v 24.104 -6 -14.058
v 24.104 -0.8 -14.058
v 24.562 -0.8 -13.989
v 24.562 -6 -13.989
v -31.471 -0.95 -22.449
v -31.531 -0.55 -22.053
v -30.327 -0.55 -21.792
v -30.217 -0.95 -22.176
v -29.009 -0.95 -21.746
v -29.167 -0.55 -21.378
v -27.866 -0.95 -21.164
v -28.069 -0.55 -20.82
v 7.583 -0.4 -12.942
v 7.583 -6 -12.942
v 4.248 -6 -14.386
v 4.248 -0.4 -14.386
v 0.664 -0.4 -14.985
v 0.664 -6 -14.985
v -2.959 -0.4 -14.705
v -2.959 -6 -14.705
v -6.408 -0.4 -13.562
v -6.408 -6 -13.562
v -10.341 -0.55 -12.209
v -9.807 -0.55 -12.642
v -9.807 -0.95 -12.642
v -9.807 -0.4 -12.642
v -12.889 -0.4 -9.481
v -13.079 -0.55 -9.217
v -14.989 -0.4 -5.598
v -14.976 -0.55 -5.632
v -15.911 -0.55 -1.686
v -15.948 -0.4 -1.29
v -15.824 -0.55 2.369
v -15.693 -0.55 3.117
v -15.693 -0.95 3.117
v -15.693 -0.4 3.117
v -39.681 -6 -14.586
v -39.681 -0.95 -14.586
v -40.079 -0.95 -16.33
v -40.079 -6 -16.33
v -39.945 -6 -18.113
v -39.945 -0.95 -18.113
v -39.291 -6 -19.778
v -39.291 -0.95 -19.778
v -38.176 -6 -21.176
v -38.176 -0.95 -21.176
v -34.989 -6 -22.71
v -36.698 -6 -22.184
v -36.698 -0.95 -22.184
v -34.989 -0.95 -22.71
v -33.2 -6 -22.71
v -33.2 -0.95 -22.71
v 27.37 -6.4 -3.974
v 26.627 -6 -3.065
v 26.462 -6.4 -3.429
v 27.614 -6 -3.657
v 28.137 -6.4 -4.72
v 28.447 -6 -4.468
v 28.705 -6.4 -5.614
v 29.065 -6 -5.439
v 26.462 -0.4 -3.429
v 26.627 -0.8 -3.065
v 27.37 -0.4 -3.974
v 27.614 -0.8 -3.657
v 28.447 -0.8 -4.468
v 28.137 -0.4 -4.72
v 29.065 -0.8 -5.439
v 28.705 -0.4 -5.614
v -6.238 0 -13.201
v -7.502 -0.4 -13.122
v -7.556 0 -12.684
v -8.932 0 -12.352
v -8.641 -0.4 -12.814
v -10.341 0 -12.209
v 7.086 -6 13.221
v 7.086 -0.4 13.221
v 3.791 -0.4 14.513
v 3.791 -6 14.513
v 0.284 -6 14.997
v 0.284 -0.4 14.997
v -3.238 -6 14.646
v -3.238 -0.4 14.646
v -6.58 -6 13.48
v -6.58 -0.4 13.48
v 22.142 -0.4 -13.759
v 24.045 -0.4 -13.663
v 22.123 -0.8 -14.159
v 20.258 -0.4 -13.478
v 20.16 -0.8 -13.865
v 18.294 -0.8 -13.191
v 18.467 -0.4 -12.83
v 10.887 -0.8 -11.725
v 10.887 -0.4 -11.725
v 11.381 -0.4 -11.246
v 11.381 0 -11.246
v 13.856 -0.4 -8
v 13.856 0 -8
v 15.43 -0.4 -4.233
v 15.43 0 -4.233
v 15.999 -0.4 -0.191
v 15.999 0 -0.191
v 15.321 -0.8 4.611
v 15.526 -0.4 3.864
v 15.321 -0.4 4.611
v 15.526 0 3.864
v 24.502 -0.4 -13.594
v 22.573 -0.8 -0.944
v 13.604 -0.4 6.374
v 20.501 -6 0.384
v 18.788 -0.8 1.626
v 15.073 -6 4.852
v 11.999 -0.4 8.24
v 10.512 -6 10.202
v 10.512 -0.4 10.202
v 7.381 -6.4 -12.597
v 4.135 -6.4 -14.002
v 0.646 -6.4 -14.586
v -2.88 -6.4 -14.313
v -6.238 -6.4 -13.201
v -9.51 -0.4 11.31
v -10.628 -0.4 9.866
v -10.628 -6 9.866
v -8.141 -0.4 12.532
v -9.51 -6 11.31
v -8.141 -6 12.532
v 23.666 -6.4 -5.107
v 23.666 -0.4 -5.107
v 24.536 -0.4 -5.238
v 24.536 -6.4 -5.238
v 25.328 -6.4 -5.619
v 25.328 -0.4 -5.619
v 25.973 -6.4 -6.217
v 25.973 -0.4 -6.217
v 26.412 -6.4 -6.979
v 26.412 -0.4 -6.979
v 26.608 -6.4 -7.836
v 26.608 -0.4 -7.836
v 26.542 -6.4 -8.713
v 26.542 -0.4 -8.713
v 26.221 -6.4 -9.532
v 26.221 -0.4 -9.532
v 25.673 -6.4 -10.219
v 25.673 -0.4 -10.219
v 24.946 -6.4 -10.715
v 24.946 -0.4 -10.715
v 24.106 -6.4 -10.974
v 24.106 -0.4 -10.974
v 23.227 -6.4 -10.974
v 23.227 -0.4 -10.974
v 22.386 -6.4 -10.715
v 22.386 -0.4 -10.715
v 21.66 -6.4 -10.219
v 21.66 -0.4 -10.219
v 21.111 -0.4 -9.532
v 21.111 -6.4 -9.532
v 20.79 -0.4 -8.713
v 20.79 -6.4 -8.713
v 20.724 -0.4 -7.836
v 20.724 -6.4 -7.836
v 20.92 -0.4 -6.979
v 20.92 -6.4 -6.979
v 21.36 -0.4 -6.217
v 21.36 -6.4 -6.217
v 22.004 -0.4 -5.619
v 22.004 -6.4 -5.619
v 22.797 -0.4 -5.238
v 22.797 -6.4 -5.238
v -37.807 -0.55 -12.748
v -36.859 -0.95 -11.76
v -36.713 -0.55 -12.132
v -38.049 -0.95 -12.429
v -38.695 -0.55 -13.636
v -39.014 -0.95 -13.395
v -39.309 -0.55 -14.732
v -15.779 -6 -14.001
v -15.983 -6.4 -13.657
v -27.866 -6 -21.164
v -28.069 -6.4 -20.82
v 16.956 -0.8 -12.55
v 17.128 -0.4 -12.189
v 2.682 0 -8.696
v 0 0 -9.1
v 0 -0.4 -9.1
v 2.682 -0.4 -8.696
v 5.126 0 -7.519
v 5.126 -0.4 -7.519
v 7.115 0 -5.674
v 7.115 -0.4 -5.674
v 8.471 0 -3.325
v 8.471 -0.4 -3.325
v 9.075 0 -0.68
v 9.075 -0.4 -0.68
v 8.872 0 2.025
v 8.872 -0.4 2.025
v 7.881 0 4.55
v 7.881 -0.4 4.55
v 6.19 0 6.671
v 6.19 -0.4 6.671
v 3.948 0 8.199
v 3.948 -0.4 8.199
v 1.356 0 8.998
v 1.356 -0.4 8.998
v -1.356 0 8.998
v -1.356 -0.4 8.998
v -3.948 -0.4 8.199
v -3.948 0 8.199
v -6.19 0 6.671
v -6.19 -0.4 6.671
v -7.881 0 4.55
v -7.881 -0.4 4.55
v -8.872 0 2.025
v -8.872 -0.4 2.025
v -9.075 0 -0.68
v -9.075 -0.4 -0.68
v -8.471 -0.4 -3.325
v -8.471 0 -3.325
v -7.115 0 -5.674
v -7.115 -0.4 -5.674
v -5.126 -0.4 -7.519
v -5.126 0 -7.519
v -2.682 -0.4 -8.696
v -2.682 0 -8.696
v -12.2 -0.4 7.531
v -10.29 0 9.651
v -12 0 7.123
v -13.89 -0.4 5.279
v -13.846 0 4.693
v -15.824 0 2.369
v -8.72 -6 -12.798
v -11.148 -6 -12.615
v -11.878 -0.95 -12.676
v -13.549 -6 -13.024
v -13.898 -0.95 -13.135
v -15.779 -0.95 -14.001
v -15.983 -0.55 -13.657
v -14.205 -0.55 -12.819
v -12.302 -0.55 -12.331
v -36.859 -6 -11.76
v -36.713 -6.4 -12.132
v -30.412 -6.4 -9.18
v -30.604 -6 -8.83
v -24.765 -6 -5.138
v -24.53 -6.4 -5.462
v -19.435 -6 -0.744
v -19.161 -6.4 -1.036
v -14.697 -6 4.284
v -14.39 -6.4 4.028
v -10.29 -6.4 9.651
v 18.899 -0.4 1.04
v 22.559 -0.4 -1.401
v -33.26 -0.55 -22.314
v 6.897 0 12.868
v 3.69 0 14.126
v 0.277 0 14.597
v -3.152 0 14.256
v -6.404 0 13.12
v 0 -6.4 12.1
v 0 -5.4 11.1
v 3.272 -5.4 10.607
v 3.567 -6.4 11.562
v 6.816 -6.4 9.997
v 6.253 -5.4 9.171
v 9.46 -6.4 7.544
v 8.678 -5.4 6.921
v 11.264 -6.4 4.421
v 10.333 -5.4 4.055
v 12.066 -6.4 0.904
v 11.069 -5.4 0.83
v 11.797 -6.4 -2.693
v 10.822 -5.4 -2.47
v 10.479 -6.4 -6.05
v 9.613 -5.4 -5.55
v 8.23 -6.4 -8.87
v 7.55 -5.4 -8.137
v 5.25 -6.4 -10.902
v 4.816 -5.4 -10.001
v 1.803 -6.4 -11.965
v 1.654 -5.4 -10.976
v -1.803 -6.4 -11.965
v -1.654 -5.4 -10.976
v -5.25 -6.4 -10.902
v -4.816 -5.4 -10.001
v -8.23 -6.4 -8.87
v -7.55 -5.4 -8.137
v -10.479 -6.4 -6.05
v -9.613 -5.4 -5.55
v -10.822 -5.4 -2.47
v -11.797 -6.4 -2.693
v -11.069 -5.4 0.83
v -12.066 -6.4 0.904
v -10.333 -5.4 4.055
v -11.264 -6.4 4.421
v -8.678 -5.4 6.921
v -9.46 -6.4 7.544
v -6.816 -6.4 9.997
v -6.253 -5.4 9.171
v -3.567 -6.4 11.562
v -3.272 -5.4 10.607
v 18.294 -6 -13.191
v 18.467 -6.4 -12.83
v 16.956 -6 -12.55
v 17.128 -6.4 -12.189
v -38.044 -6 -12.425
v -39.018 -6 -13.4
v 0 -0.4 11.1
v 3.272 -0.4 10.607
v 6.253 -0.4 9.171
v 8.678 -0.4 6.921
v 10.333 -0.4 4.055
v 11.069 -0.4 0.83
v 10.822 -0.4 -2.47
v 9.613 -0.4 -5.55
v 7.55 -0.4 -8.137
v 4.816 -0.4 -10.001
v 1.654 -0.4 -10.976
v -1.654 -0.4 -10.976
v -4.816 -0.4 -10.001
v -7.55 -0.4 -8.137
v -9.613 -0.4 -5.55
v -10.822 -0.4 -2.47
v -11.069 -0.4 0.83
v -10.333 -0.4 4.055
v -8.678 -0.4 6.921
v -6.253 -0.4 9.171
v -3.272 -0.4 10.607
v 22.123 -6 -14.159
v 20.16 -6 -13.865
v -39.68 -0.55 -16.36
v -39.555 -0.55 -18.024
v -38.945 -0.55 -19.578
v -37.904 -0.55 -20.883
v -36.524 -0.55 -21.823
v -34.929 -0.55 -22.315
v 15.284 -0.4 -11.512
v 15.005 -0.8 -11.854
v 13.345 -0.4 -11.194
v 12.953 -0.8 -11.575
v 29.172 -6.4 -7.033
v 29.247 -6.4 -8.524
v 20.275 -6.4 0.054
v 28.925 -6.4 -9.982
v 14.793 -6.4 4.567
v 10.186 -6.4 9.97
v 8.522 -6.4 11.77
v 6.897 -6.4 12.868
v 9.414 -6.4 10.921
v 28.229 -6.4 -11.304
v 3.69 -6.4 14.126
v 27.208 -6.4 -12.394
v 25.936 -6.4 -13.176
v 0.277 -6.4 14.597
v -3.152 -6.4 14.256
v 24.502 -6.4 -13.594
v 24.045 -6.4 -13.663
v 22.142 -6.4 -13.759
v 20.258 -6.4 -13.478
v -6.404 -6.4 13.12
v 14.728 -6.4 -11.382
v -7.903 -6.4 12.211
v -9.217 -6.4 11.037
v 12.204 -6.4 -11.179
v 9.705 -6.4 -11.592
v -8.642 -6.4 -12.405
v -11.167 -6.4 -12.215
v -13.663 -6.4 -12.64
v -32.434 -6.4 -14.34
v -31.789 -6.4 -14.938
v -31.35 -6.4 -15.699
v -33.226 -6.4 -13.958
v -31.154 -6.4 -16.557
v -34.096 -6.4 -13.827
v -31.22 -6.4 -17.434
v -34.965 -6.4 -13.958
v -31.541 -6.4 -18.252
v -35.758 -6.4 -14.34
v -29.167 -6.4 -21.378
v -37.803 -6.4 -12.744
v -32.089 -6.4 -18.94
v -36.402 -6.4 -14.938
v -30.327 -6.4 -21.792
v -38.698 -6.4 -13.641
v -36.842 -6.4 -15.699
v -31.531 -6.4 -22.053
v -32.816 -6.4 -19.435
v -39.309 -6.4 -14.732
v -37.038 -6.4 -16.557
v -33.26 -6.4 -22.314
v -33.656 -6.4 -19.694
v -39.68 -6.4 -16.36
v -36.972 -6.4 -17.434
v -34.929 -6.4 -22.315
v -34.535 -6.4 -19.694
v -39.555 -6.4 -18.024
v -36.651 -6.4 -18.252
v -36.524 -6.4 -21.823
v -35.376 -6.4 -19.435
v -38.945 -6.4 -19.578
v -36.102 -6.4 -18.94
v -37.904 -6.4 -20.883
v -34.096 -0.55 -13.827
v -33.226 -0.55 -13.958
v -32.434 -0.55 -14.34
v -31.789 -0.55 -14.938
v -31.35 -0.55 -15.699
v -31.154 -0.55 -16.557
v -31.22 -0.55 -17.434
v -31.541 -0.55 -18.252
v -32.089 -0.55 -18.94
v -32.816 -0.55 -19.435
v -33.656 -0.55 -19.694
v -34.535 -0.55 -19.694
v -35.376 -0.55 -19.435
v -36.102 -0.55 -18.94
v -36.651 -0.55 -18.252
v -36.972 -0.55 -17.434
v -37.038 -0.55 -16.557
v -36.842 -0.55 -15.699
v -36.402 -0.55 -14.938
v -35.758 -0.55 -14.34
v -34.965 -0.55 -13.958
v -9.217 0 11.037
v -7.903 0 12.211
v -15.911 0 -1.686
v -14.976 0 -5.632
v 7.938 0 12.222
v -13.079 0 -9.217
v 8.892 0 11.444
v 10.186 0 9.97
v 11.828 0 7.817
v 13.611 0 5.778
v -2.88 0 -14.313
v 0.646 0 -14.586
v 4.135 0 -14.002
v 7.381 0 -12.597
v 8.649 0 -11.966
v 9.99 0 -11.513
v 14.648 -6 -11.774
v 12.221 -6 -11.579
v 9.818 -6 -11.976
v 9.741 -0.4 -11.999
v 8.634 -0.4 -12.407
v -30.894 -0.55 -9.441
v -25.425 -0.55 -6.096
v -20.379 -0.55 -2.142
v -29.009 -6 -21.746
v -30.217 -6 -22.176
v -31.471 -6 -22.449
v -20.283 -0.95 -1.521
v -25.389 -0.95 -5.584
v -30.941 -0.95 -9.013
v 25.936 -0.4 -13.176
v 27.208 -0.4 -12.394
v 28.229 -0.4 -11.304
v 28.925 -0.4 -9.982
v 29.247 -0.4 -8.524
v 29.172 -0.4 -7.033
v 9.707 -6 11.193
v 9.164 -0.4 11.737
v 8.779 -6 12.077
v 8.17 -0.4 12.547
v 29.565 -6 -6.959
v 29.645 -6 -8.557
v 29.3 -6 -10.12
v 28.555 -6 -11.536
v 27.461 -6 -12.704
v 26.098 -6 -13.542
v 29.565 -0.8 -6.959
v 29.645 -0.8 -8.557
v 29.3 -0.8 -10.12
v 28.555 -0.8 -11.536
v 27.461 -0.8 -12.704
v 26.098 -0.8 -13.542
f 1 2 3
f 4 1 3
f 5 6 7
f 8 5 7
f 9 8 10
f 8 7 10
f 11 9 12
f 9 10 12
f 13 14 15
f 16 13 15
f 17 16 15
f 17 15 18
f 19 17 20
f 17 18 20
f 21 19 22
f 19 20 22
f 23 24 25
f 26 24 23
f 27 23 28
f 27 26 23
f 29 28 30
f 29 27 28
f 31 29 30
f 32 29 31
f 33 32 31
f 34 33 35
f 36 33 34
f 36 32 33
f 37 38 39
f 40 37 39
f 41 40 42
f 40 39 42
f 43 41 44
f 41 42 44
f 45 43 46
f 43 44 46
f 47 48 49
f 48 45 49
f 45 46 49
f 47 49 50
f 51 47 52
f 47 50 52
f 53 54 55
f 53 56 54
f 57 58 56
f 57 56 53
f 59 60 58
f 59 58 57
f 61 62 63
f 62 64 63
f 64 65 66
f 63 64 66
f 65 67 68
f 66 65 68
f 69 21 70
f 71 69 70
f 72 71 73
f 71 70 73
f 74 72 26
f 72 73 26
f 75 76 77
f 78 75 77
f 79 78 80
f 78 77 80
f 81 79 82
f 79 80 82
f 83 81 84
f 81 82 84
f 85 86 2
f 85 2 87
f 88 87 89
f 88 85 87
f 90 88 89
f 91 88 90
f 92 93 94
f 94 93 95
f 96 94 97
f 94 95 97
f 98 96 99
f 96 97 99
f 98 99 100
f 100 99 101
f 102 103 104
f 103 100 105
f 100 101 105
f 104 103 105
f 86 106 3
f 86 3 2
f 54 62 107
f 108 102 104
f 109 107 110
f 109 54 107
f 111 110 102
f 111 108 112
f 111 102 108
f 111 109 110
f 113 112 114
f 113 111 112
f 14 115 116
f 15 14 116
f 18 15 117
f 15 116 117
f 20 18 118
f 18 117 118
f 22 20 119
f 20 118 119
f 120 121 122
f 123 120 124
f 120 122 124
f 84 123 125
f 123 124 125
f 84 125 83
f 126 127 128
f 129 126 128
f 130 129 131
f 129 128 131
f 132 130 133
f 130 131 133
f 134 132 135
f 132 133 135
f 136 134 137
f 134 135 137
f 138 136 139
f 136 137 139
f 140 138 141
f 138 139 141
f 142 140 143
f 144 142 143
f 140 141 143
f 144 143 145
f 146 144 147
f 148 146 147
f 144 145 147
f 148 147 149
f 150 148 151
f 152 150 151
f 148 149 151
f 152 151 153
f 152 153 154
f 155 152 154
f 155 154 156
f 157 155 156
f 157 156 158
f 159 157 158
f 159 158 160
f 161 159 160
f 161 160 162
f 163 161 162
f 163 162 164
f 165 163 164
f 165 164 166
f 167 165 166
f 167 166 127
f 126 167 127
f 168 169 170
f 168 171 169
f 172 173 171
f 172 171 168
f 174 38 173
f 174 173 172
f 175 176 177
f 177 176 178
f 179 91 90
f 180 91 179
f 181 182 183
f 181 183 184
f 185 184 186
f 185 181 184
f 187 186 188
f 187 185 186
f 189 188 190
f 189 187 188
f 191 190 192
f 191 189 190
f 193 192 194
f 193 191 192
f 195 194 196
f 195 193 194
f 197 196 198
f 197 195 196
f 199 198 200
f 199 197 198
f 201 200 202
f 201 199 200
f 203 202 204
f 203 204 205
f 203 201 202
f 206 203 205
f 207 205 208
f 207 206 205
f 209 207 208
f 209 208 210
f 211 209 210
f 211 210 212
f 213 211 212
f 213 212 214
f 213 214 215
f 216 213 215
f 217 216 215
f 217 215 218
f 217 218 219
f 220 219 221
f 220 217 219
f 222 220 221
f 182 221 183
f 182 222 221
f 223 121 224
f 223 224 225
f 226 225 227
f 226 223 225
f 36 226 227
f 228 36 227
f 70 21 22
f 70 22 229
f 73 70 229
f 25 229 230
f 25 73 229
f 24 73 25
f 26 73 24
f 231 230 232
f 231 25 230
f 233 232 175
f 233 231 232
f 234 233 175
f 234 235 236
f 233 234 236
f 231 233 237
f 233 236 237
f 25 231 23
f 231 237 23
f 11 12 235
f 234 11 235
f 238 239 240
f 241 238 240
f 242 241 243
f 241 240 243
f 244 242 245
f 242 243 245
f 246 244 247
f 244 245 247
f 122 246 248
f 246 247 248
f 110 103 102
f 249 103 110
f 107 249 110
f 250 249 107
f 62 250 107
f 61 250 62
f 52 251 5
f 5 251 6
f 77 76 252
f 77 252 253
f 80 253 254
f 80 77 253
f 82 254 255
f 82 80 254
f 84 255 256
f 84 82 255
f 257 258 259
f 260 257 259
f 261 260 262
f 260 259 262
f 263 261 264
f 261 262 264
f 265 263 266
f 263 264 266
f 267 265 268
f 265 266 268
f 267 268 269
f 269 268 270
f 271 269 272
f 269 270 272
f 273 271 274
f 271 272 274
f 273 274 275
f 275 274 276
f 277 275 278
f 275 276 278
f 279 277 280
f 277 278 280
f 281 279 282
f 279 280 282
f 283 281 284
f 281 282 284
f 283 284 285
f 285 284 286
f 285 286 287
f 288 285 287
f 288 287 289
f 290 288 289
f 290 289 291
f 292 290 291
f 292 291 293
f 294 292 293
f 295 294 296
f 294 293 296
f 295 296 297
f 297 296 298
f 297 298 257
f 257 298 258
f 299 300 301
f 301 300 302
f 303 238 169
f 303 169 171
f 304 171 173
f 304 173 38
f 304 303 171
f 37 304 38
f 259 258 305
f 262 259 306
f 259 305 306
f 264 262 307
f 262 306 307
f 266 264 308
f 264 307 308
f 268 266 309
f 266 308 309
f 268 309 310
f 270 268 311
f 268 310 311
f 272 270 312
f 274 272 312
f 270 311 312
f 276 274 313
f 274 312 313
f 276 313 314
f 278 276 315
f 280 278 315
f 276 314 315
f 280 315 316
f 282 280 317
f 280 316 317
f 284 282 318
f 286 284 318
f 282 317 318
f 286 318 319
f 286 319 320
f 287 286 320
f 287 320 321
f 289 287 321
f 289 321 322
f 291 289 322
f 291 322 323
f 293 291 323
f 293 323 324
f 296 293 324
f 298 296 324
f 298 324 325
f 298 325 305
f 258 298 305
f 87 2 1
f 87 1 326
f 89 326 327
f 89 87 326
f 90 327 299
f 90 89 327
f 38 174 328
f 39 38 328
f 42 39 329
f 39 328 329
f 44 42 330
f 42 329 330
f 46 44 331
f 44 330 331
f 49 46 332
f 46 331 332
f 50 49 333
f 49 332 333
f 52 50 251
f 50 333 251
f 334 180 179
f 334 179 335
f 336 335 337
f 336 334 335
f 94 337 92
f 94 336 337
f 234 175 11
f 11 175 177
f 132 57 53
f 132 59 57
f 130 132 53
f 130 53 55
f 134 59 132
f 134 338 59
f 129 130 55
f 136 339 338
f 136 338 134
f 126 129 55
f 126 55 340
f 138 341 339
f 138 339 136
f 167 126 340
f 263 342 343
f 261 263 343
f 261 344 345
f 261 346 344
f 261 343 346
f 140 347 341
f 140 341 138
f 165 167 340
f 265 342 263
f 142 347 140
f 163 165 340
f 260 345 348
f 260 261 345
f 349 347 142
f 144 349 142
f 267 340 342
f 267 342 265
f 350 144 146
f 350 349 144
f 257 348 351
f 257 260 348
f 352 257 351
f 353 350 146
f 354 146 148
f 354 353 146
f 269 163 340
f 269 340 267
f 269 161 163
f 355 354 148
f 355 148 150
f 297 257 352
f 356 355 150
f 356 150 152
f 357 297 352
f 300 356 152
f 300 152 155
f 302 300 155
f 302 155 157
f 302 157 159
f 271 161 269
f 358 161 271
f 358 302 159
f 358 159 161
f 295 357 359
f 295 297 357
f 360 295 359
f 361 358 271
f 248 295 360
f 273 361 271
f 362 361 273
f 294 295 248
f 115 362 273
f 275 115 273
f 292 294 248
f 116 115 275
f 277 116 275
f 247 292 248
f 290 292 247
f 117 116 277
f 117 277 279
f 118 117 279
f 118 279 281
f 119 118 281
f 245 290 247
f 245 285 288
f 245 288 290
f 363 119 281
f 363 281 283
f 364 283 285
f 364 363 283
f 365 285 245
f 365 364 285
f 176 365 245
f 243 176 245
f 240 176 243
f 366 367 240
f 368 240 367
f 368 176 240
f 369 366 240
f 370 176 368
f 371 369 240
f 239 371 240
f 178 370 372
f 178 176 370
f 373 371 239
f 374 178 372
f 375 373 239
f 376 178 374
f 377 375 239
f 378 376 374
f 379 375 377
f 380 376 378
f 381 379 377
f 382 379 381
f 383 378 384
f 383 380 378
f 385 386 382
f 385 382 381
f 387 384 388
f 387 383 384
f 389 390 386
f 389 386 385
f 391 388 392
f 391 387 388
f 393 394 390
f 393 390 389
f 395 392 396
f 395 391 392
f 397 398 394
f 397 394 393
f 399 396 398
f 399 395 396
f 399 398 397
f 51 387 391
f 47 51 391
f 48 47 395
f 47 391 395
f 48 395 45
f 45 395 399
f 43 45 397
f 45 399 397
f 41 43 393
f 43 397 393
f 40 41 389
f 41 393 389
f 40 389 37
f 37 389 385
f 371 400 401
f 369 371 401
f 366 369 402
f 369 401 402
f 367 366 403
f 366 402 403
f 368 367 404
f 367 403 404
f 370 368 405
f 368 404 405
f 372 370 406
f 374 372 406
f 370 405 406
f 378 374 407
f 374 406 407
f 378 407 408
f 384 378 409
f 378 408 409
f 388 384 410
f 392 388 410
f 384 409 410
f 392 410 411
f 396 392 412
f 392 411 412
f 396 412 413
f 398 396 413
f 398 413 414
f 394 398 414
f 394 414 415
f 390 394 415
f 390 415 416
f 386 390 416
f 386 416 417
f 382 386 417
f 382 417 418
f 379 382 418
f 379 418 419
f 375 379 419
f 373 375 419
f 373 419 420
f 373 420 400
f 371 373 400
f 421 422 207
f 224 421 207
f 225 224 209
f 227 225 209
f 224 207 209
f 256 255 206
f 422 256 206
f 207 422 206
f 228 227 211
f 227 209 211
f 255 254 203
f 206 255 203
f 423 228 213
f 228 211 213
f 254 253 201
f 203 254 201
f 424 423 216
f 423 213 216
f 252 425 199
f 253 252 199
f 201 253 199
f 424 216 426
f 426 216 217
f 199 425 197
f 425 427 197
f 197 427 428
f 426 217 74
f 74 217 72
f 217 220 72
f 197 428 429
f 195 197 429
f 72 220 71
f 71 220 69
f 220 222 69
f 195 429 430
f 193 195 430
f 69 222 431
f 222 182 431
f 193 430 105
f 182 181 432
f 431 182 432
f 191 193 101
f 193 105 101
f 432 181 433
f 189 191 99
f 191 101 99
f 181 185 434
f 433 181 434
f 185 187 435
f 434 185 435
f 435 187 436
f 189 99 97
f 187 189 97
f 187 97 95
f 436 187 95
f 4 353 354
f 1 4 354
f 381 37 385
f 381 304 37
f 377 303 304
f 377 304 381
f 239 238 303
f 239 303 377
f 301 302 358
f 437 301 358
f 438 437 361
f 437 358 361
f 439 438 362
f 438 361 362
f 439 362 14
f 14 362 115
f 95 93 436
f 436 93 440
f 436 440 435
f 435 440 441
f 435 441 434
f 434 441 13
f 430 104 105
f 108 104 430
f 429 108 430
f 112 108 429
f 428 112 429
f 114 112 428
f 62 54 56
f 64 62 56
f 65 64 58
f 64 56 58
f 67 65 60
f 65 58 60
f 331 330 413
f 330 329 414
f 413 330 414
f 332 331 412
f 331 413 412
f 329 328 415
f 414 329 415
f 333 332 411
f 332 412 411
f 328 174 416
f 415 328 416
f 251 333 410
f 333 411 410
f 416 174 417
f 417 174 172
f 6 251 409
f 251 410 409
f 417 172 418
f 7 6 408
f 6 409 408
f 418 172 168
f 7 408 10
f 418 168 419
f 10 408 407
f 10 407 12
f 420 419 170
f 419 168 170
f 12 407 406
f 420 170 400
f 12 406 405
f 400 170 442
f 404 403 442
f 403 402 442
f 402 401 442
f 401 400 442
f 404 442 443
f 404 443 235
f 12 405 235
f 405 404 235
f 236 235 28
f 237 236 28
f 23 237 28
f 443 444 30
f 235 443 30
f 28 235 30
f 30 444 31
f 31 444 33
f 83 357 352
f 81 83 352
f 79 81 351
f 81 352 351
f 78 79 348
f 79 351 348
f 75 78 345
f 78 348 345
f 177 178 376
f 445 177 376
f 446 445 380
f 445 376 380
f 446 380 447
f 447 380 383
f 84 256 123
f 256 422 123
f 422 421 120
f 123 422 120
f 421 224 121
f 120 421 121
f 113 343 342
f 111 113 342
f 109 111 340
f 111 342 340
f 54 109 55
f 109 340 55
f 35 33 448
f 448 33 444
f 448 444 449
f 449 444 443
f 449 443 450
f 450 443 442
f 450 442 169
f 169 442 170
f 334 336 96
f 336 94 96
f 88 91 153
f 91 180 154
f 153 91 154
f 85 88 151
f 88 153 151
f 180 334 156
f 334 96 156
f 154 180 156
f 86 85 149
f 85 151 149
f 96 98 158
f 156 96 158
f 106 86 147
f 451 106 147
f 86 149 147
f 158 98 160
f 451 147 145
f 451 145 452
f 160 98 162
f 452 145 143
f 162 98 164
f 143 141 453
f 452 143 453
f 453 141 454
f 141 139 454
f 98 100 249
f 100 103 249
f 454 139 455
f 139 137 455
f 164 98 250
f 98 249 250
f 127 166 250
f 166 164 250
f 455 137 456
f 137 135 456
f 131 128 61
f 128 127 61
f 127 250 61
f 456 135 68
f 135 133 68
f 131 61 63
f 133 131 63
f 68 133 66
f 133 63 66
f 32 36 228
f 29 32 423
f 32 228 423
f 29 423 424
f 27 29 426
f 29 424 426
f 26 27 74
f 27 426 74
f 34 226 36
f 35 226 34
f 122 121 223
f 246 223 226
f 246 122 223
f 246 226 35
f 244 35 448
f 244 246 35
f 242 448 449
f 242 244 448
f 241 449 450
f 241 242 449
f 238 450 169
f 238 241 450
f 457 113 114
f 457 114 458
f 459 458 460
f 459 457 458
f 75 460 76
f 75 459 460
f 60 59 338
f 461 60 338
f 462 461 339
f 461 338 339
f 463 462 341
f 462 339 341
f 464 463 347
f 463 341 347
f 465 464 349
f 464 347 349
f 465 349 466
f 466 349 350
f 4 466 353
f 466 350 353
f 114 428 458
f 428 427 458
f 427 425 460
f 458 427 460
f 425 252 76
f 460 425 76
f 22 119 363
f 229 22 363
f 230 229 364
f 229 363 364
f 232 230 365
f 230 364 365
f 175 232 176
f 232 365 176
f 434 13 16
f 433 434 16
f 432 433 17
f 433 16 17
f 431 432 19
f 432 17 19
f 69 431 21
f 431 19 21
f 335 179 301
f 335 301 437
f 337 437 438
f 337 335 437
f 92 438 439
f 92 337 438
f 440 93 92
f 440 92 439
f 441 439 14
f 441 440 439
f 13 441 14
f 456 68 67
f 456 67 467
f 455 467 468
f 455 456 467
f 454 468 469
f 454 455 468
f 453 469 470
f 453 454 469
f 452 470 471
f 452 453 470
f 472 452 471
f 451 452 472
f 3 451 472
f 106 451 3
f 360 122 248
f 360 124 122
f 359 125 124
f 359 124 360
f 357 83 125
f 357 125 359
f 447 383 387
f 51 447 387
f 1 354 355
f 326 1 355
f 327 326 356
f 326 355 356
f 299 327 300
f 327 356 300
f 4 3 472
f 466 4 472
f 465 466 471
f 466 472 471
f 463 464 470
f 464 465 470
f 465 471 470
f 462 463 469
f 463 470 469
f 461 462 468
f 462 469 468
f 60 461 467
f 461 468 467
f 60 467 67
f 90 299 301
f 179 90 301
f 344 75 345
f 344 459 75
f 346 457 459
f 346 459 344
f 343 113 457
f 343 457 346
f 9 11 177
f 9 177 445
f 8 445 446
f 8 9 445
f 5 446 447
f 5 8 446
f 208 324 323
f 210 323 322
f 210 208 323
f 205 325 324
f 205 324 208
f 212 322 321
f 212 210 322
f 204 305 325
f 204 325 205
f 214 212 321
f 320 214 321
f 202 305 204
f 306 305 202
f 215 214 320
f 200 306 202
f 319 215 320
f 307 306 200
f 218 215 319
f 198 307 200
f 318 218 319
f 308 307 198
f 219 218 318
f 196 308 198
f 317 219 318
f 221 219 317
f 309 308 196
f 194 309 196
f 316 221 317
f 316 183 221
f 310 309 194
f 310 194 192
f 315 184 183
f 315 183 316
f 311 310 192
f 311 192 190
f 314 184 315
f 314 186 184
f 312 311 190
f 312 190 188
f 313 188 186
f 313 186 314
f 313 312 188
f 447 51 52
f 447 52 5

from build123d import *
from build123d.topology import SkipClean

# Parameters (mm, degrees)
SKETCH1_R           = 11.1
SKETCH1_R_2         = 2.95
BOSS_EXTRUDE1_DEPTH = 6.4
CUT_EXTRUDE4_REACH  = 48.556
CHAMFER1_SIZE       = 1
CUT_EXTRUDE3_DEPTH  = 47.555734529
FILLET1_R           = 10
FILLET2_R           = 5
SKETCH7_R           = 11.1
SKETCH7_R_2         = 9.1
BOSS_EXTRUDE2_DEPTH = 0.4
SKETCH9_OUTSIDE_W   = 87.68
SKETCH9_OUTSIDE_H   = 55.695
SKETCH9_OUTSIDE_R   = 16
CUT_EXTRUDE5_DEPTH  = 0.4
CUT_EXTRUDE6_DEPTH  = 0.15
CHAMFER2_SIZE       = 0.4


with BuildPart() as part:
    # Sketch1 → Boss-Extrude1 (new body)
    with BuildSketch(Plane(origin=(0, 0, 0), x_dir=(1, 0, 0), z_dir=(0, 1, 0))):
        with BuildLine():
            Line((-9.621787606, -11.507441213), (-37.944538575, 12.174234774))
            ThreePointArc((-37.944538575, 12.174234774), (-39.566706632, 19.240834224), (-33.200130557, 22.709979086))
            Line((-33.200130557, 22.709979086), (24.561921844, 13.989417946))
            ThreePointArc((24.561921844, 13.989417946), (29.443583706, 9.675962035), (27.514943911, 3.453673633))
            Line((27.514943911, 3.453673633), (9.621787606, -11.507441213))
            ThreePointArc((9.621787606, -11.507441213), (0, -15), (-9.621787606, -11.507441213))
        make_face()
        with Locations(Location((0, 0, 0), (0, 0, 270))):
            Circle(SKETCH1_R, mode=Mode.SUBTRACT)
        with Locations(Location((-34.095823533, 16.777211259, 0), (0, 0, 270))):
            Circle(SKETCH1_R_2, mode=Mode.SUBTRACT)
        with Locations(Location((23.666228869, 8.056650118, 0), (0, 0, 270))):
            Circle(SKETCH1_R_2, mode=Mode.SUBTRACT)
    extrude(amount=BOSS_EXTRUDE1_DEPTH)

    # Sketch6 → Cut-Extrude4 (cut, up to next)
    with BuildSketch(Plane(origin=(0, 6.4, 0), x_dir=(1, 0, 0), z_dir=(0, 1, 0)), mode=Mode.PRIVATE) as cut_extrude4_sk1:
        with BuildLine():
            Line((-10.397549699, 10.811612287), (-29.542980034, 22.157844884))
            Line((-29.542980034, 22.157844884), (21.066082003, 14.517198449))
            Line((21.066082003, 14.517198449), (11.313303216, 9.849323344))
            ThreePointArc((11.313303216, 9.849323344), (0.664192087, 14.985287747), (-10.397549699, 10.811612287))
        make_face()
    cut_extrude4_tool1 = extrude(cut_extrude4_sk1.sketch, amount=-CUT_EXTRUDE4_REACH, mode=Mode.PRIVATE) & part.part
    add(cut_extrude4_tool1.solids().sort_by_distance((-4.90649, 6.4, -15.955418))[0], mode=Mode.SUBTRACT)

    # Chamfer1
    chamfer1_edges = [part.edges().sort_by_distance(p)[0] for p in [
        (0, 6.4, -11.1),
    ]]
    chamfer(chamfer1_edges, length=CHAMFER1_SIZE)

    # Sketch5 → Cut-Extrude3 (cut, through all)
    with BuildSketch(Plane(origin=(0, 6.4, 0), x_dir=(1, 0, 0), z_dir=(0, 1, 0))):
        with BuildLine():
            Line((-37.944538575, 12.174234774), (-9.621787606, -11.507441213))
            ThreePointArc((-9.621787606, -11.507441213), (-21.736768022, 2.78083918), (-37.944538575, 12.174234774))
        make_face()
        with BuildLine():
            Line((9.621787606, -11.507441213), (27.514943911, 3.453673633))
            ThreePointArc((27.514943911, 3.453673633), (17.45368355, -2.69374898), (9.621787606, -11.507441213))
        make_face()
    extrude(amount=-CUT_EXTRUDE3_DEPTH, mode=Mode.SUBTRACT)

    # Fillet1
    fillet1_edges = [part.edges().sort_by_distance(p)[0] for p in [
        (-9.621787606, 3.2, 11.507441213),
        (9.621787606, 3.2, 11.507441213),
        (11.313303216, 3.2, -9.849323344),
        (-10.397549699, 3.2, -10.811612287),
        (-29.542980034, 3.2, -22.157844884),
        (21.066082003, 3.2, -14.517198449),
    ]]
    fillet(fillet1_edges, radius=FILLET1_R)

    # Fillet2
    fillet2_edges = [part.edges().sort_by_distance(p)[0] for p in [
        (-37.944538575, 3.2, -12.174234774),
        (27.514943911, 3.2, -3.453673633),
    ]]
    fillet(fillet2_edges, radius=FILLET2_R)

    # Sketch7 → Boss-Extrude2 (add)
    with BuildSketch(Plane.XZ):
        with Locations(Location((0, 0, 0), (0, 0, 270))):
            Circle(SKETCH7_R)
        with Locations(Location((0, 0, 0), (0, 0, 270))):
            Circle(SKETCH7_R_2, mode=Mode.SUBTRACT)
    extrude(amount=-BOSS_EXTRUDE2_DEPTH)

    # Sketch9 outside → Cut-Extrude5 (cut)
    with BuildSketch(Plane.XZ):
        with Locations((-5.215, -3.8885)):
            Rectangle(SKETCH9_OUTSIDE_W, SKETCH9_OUTSIDE_H)
        Circle(SKETCH9_OUTSIDE_R, mode=Mode.SUBTRACT)
    extrude(amount=-CUT_EXTRUDE5_DEPTH, mode=Mode.SUBTRACT)

    # Sketch10 → Cut-Extrude6 (cut)
    with SkipClean():  # the faces are left unmerged after this step: merging them gives an invalid solid
        with BuildSketch(Plane.XZ.offset(-0.4)):
            with BuildLine():
                Line((-33.200130557, -22.709979086), (-31.471010975, -22.448927195))
                ThreePointArc((-31.471010975, -22.448927195), (-29.606213483, -21.980449689), (-27.865545183, -21.16373999))
                Line((-27.865545183, -21.16373999), (-15.778990975, -14.000837254))
                ThreePointArc((-15.778990975, -14.000837254), (-12.899787471, -12.852921242), (-9.807384948, -12.641803688))
                ThreePointArc((-9.807384948, -12.641803688), (-14.988647226, -5.59825458), (-15.693394103, 3.11727149))
                ThreePointArc((-15.693394103, 3.11727149), (-25.389120558, -5.583543581), (-36.859243696, -11.759915461))
                ThreePointArc((-36.859243696, -11.759915461), (-38.564746422, -12.878937509), (-39.681392394, -14.585996871))
                ThreePointArc((-39.681392394, -14.585996871), (-38.786079998, -20.519068323), (-33.200130557, -22.709979086))
            make_face()
        extrude(amount=-CUT_EXTRUDE6_DEPTH, mode=Mode.SUBTRACT)

    # Chamfer2
    chamfer2_edges = [part.edges().sort_by_distance(p)[0] for p in [
        (9.181258422, 0, -12.186693797),
        (0.664192087, 0, -14.985287747),
        (-8.067073348, 0, -12.95119066),
        (12.787484872, 0, 7.295073573),
        (8.973593298, 0, 11.909370886),
        (0.284328537, 0, 14.997305001),
        (-8.853535866, 0, 11.952551059),
        (-13.030899461, 0, 6.394129067),
        (-8.853535866, 6.4, 11.952551059),
        (0.284328537, 6.4, 14.997305001),
        (-22.030616875, 6.4, -3.024808286),
        (8.973593298, 6.4, 11.909370886),
        (-38.564746422, 6.4, -12.878937509),
        (17.688730274, 6.4, 2.498737743),
        (-38.786079998, 6.4, -20.519068323),
        (28.054256045, 6.4, -4.038174832),
        (-32.335570766, 6.4, -22.579453141),
        (28.974894193, 6.4, -10.852731747),
        (-29.606213483, 6.4, -21.980449689),
        (24.33317404, 6.4, -14.023952889),
        (-21.822268079, 6.4, -17.582288622),
        (21.134254432, 6.4, -14.06081124),
        (-11.148337367, 6.4, -12.614536482),
        (17.625106381, 6.4, -12.870278654),
        (0.664192087, 6.4, -14.985287747),
        (12.220655249, 6.4, -11.578753904),
        (13.986327713, 0.4, -11.661249433),
        (17.625106381, 0.4, -12.870278654),
        (21.134254432, 0.4, -14.06081124),
        (20.643800798, 0.4, 0.286607853),
        (24.33317404, 0.4, -14.023952889),
        (28.054256045, 0.4, -4.038174832),
        (28.974894193, 0.4, -10.852731747),
        (-25.389120558, 0.55, -5.583543581),
        (-38.564746422, 0.55, -12.878937509),
        (-38.786079998, 0.55, -20.519068323),
        (-32.335570766, 0.55, -22.579453141),
        (-29.606213483, 0.55, -21.980449689),
        (-12.899787471, 0.55, -12.852921242),
        (-21.822268079, 0.55, -17.582288622),
    ]]
    chamfer(chamfer2_edges, length=CHAMFER2_SIZE)


with BuildPart() as body_2:
    # Mirror1: mirrored copy
    add(part.part.mirror(Plane.ZX))


solid = body_2.part
